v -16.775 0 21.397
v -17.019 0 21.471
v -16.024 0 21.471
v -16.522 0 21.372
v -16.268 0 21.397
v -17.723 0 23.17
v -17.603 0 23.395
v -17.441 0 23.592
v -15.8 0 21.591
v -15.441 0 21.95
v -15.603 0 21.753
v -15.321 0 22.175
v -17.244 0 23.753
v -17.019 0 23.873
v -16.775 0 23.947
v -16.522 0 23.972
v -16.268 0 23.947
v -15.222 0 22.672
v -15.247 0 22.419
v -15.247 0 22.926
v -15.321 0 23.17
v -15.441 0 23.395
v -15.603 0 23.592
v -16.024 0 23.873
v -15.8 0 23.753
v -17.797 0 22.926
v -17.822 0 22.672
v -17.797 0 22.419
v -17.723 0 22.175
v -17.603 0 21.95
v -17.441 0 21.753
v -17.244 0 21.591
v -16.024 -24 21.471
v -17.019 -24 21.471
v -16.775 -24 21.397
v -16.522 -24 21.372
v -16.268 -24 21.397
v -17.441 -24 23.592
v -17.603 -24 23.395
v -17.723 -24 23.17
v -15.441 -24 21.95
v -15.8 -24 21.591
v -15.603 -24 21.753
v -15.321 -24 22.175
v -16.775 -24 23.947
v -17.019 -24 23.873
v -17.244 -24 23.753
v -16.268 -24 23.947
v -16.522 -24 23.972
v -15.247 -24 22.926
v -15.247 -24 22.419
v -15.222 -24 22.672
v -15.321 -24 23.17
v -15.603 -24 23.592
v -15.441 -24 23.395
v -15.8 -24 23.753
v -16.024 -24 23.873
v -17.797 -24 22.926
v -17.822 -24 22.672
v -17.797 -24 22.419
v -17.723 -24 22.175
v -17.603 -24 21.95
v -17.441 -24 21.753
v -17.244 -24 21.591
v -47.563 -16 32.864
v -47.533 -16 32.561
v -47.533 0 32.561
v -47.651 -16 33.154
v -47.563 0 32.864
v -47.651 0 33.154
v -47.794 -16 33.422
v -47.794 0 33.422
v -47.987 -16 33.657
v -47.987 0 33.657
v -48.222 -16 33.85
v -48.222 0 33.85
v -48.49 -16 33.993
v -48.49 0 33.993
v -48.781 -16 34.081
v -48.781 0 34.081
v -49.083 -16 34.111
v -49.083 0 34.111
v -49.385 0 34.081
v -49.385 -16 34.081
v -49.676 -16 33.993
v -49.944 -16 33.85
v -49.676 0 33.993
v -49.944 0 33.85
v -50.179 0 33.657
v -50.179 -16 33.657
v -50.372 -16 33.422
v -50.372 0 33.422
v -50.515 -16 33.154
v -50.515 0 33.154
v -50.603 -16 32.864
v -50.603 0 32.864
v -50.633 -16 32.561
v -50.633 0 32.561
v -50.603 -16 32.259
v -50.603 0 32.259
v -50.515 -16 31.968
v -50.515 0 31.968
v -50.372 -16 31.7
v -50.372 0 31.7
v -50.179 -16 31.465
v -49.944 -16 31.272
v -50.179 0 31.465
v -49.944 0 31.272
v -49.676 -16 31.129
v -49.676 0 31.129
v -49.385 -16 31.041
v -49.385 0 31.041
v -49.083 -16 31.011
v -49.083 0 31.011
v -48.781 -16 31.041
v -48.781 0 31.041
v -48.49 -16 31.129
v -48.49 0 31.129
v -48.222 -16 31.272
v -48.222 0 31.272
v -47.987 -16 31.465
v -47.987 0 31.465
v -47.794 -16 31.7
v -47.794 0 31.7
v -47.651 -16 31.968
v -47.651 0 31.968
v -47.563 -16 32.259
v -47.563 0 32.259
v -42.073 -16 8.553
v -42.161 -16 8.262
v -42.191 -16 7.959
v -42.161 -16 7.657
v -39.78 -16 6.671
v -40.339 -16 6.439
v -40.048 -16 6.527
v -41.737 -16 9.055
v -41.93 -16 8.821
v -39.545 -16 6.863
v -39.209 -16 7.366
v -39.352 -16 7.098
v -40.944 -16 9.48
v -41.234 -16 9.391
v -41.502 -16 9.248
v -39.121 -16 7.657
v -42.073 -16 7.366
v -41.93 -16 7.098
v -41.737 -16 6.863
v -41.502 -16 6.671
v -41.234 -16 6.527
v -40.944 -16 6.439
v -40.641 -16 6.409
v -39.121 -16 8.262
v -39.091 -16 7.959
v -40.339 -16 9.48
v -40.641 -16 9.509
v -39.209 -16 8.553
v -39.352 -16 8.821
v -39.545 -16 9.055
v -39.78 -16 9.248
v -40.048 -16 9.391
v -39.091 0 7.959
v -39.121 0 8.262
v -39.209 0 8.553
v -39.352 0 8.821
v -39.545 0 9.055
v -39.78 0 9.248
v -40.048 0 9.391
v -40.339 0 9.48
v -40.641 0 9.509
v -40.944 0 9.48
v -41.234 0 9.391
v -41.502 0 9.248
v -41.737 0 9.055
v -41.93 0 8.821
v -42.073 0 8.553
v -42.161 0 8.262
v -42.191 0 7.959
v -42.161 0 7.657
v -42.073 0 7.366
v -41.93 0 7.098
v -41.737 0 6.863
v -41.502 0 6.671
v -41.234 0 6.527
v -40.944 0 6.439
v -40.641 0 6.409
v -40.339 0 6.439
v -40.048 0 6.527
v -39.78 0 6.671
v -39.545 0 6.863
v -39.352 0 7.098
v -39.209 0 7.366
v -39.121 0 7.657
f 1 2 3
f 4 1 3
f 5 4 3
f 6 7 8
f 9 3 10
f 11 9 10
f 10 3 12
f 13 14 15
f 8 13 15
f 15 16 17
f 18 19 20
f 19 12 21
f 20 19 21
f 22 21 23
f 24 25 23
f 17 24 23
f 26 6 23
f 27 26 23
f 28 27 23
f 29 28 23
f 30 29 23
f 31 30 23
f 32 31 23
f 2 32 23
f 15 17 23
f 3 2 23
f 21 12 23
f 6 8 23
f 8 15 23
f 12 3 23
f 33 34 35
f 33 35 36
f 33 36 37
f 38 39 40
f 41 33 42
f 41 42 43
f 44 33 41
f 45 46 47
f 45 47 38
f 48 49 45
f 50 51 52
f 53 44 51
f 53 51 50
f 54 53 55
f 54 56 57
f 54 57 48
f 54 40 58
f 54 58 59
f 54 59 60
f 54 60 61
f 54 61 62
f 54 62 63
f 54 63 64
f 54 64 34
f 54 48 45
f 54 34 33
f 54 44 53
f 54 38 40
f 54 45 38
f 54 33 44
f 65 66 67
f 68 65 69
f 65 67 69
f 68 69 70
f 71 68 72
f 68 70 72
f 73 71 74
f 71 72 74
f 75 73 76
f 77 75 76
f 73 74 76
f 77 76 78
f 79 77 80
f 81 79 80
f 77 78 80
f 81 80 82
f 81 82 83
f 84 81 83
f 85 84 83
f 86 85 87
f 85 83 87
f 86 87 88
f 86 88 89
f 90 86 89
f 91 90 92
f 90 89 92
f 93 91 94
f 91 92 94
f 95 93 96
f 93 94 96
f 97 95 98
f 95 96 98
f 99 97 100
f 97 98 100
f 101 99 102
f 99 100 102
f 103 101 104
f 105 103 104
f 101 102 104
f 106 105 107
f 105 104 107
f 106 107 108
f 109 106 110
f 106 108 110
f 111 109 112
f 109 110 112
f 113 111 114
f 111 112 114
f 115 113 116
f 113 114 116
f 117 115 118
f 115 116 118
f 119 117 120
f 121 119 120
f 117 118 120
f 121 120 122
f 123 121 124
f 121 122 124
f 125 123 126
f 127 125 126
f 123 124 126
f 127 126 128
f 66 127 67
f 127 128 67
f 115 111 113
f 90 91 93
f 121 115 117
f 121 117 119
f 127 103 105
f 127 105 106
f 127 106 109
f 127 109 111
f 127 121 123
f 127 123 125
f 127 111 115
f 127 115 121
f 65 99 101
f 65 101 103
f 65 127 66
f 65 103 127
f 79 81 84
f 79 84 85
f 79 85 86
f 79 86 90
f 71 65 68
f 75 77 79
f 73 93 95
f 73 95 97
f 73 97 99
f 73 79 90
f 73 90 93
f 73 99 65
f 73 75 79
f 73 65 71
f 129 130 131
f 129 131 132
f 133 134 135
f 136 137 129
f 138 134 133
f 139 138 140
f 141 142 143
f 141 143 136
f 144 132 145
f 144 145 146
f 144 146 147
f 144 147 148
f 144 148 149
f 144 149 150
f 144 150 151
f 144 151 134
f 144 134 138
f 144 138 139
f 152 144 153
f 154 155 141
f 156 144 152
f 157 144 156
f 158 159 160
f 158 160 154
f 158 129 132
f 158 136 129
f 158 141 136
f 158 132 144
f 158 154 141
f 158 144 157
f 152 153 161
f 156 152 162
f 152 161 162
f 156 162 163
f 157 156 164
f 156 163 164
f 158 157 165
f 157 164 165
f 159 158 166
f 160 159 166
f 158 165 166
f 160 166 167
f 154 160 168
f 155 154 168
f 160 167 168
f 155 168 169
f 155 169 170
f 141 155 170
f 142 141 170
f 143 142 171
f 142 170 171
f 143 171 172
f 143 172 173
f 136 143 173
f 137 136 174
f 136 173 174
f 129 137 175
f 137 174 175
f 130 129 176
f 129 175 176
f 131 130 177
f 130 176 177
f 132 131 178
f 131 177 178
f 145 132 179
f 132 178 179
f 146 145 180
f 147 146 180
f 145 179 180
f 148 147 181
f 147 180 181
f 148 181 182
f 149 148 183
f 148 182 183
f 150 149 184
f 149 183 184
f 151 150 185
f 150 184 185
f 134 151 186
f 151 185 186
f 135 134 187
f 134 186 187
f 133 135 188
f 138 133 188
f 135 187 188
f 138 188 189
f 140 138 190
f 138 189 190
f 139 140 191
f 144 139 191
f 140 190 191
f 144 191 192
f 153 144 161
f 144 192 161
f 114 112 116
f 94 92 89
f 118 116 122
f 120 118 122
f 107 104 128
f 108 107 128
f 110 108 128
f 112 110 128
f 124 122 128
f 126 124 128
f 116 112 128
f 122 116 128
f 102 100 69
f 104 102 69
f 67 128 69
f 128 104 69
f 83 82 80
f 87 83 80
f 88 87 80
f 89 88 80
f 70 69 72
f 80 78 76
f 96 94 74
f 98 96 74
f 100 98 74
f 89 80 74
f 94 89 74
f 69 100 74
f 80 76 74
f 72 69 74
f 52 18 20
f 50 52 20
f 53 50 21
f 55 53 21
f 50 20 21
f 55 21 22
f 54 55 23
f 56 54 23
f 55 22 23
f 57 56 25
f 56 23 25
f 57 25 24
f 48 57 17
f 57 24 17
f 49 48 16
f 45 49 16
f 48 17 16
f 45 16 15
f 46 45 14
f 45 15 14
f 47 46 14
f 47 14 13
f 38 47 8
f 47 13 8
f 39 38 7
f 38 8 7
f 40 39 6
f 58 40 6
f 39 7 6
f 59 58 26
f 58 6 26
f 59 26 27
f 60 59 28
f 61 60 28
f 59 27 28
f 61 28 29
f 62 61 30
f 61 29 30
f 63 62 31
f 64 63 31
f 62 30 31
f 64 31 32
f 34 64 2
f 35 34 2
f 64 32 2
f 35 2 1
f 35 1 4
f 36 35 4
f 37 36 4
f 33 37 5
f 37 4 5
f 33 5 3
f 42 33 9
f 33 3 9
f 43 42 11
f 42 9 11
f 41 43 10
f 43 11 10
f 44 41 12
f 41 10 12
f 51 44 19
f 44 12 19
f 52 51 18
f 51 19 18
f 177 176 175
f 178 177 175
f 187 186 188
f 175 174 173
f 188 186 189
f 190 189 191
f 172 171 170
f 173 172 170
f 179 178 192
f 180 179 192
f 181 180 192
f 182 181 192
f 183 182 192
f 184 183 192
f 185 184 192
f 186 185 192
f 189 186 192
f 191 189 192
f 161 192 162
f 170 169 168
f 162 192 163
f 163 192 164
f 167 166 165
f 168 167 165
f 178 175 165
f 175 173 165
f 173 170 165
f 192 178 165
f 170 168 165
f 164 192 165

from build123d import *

# Parameters (mm, degrees)
F0_R     = 1.55
F1_DEPTH = 16
F2_R     = 1.55
F3_DEPTH = 16
F4_R     = 1.3
F5_DEPTH = 24


with BuildPart() as f1:
    # F0 (on Front) → F1 (new body)
    with BuildSketch(Plane.XZ):
        with Locations((-49.08308, 32.561257)):
            Circle(F0_R)
    extrude(amount=F1_DEPTH)


with BuildPart() as f3:
    # F2 (on Front) → F3 (new body)
    with BuildSketch(Plane.XZ):
        with Locations((-40.641274, 7.959418)):
            Circle(F2_R)
    extrude(amount=F3_DEPTH)


with BuildPart() as f5:
    # F4 (on Front) → F5 (new body)
    with BuildSketch(Plane.XZ):
        with Locations((-16.521823, 22.672283)):
            Circle(F4_R)
    extrude(amount=F5_DEPTH)


solid = Compound([f1.part, f3.part, f5.part])
